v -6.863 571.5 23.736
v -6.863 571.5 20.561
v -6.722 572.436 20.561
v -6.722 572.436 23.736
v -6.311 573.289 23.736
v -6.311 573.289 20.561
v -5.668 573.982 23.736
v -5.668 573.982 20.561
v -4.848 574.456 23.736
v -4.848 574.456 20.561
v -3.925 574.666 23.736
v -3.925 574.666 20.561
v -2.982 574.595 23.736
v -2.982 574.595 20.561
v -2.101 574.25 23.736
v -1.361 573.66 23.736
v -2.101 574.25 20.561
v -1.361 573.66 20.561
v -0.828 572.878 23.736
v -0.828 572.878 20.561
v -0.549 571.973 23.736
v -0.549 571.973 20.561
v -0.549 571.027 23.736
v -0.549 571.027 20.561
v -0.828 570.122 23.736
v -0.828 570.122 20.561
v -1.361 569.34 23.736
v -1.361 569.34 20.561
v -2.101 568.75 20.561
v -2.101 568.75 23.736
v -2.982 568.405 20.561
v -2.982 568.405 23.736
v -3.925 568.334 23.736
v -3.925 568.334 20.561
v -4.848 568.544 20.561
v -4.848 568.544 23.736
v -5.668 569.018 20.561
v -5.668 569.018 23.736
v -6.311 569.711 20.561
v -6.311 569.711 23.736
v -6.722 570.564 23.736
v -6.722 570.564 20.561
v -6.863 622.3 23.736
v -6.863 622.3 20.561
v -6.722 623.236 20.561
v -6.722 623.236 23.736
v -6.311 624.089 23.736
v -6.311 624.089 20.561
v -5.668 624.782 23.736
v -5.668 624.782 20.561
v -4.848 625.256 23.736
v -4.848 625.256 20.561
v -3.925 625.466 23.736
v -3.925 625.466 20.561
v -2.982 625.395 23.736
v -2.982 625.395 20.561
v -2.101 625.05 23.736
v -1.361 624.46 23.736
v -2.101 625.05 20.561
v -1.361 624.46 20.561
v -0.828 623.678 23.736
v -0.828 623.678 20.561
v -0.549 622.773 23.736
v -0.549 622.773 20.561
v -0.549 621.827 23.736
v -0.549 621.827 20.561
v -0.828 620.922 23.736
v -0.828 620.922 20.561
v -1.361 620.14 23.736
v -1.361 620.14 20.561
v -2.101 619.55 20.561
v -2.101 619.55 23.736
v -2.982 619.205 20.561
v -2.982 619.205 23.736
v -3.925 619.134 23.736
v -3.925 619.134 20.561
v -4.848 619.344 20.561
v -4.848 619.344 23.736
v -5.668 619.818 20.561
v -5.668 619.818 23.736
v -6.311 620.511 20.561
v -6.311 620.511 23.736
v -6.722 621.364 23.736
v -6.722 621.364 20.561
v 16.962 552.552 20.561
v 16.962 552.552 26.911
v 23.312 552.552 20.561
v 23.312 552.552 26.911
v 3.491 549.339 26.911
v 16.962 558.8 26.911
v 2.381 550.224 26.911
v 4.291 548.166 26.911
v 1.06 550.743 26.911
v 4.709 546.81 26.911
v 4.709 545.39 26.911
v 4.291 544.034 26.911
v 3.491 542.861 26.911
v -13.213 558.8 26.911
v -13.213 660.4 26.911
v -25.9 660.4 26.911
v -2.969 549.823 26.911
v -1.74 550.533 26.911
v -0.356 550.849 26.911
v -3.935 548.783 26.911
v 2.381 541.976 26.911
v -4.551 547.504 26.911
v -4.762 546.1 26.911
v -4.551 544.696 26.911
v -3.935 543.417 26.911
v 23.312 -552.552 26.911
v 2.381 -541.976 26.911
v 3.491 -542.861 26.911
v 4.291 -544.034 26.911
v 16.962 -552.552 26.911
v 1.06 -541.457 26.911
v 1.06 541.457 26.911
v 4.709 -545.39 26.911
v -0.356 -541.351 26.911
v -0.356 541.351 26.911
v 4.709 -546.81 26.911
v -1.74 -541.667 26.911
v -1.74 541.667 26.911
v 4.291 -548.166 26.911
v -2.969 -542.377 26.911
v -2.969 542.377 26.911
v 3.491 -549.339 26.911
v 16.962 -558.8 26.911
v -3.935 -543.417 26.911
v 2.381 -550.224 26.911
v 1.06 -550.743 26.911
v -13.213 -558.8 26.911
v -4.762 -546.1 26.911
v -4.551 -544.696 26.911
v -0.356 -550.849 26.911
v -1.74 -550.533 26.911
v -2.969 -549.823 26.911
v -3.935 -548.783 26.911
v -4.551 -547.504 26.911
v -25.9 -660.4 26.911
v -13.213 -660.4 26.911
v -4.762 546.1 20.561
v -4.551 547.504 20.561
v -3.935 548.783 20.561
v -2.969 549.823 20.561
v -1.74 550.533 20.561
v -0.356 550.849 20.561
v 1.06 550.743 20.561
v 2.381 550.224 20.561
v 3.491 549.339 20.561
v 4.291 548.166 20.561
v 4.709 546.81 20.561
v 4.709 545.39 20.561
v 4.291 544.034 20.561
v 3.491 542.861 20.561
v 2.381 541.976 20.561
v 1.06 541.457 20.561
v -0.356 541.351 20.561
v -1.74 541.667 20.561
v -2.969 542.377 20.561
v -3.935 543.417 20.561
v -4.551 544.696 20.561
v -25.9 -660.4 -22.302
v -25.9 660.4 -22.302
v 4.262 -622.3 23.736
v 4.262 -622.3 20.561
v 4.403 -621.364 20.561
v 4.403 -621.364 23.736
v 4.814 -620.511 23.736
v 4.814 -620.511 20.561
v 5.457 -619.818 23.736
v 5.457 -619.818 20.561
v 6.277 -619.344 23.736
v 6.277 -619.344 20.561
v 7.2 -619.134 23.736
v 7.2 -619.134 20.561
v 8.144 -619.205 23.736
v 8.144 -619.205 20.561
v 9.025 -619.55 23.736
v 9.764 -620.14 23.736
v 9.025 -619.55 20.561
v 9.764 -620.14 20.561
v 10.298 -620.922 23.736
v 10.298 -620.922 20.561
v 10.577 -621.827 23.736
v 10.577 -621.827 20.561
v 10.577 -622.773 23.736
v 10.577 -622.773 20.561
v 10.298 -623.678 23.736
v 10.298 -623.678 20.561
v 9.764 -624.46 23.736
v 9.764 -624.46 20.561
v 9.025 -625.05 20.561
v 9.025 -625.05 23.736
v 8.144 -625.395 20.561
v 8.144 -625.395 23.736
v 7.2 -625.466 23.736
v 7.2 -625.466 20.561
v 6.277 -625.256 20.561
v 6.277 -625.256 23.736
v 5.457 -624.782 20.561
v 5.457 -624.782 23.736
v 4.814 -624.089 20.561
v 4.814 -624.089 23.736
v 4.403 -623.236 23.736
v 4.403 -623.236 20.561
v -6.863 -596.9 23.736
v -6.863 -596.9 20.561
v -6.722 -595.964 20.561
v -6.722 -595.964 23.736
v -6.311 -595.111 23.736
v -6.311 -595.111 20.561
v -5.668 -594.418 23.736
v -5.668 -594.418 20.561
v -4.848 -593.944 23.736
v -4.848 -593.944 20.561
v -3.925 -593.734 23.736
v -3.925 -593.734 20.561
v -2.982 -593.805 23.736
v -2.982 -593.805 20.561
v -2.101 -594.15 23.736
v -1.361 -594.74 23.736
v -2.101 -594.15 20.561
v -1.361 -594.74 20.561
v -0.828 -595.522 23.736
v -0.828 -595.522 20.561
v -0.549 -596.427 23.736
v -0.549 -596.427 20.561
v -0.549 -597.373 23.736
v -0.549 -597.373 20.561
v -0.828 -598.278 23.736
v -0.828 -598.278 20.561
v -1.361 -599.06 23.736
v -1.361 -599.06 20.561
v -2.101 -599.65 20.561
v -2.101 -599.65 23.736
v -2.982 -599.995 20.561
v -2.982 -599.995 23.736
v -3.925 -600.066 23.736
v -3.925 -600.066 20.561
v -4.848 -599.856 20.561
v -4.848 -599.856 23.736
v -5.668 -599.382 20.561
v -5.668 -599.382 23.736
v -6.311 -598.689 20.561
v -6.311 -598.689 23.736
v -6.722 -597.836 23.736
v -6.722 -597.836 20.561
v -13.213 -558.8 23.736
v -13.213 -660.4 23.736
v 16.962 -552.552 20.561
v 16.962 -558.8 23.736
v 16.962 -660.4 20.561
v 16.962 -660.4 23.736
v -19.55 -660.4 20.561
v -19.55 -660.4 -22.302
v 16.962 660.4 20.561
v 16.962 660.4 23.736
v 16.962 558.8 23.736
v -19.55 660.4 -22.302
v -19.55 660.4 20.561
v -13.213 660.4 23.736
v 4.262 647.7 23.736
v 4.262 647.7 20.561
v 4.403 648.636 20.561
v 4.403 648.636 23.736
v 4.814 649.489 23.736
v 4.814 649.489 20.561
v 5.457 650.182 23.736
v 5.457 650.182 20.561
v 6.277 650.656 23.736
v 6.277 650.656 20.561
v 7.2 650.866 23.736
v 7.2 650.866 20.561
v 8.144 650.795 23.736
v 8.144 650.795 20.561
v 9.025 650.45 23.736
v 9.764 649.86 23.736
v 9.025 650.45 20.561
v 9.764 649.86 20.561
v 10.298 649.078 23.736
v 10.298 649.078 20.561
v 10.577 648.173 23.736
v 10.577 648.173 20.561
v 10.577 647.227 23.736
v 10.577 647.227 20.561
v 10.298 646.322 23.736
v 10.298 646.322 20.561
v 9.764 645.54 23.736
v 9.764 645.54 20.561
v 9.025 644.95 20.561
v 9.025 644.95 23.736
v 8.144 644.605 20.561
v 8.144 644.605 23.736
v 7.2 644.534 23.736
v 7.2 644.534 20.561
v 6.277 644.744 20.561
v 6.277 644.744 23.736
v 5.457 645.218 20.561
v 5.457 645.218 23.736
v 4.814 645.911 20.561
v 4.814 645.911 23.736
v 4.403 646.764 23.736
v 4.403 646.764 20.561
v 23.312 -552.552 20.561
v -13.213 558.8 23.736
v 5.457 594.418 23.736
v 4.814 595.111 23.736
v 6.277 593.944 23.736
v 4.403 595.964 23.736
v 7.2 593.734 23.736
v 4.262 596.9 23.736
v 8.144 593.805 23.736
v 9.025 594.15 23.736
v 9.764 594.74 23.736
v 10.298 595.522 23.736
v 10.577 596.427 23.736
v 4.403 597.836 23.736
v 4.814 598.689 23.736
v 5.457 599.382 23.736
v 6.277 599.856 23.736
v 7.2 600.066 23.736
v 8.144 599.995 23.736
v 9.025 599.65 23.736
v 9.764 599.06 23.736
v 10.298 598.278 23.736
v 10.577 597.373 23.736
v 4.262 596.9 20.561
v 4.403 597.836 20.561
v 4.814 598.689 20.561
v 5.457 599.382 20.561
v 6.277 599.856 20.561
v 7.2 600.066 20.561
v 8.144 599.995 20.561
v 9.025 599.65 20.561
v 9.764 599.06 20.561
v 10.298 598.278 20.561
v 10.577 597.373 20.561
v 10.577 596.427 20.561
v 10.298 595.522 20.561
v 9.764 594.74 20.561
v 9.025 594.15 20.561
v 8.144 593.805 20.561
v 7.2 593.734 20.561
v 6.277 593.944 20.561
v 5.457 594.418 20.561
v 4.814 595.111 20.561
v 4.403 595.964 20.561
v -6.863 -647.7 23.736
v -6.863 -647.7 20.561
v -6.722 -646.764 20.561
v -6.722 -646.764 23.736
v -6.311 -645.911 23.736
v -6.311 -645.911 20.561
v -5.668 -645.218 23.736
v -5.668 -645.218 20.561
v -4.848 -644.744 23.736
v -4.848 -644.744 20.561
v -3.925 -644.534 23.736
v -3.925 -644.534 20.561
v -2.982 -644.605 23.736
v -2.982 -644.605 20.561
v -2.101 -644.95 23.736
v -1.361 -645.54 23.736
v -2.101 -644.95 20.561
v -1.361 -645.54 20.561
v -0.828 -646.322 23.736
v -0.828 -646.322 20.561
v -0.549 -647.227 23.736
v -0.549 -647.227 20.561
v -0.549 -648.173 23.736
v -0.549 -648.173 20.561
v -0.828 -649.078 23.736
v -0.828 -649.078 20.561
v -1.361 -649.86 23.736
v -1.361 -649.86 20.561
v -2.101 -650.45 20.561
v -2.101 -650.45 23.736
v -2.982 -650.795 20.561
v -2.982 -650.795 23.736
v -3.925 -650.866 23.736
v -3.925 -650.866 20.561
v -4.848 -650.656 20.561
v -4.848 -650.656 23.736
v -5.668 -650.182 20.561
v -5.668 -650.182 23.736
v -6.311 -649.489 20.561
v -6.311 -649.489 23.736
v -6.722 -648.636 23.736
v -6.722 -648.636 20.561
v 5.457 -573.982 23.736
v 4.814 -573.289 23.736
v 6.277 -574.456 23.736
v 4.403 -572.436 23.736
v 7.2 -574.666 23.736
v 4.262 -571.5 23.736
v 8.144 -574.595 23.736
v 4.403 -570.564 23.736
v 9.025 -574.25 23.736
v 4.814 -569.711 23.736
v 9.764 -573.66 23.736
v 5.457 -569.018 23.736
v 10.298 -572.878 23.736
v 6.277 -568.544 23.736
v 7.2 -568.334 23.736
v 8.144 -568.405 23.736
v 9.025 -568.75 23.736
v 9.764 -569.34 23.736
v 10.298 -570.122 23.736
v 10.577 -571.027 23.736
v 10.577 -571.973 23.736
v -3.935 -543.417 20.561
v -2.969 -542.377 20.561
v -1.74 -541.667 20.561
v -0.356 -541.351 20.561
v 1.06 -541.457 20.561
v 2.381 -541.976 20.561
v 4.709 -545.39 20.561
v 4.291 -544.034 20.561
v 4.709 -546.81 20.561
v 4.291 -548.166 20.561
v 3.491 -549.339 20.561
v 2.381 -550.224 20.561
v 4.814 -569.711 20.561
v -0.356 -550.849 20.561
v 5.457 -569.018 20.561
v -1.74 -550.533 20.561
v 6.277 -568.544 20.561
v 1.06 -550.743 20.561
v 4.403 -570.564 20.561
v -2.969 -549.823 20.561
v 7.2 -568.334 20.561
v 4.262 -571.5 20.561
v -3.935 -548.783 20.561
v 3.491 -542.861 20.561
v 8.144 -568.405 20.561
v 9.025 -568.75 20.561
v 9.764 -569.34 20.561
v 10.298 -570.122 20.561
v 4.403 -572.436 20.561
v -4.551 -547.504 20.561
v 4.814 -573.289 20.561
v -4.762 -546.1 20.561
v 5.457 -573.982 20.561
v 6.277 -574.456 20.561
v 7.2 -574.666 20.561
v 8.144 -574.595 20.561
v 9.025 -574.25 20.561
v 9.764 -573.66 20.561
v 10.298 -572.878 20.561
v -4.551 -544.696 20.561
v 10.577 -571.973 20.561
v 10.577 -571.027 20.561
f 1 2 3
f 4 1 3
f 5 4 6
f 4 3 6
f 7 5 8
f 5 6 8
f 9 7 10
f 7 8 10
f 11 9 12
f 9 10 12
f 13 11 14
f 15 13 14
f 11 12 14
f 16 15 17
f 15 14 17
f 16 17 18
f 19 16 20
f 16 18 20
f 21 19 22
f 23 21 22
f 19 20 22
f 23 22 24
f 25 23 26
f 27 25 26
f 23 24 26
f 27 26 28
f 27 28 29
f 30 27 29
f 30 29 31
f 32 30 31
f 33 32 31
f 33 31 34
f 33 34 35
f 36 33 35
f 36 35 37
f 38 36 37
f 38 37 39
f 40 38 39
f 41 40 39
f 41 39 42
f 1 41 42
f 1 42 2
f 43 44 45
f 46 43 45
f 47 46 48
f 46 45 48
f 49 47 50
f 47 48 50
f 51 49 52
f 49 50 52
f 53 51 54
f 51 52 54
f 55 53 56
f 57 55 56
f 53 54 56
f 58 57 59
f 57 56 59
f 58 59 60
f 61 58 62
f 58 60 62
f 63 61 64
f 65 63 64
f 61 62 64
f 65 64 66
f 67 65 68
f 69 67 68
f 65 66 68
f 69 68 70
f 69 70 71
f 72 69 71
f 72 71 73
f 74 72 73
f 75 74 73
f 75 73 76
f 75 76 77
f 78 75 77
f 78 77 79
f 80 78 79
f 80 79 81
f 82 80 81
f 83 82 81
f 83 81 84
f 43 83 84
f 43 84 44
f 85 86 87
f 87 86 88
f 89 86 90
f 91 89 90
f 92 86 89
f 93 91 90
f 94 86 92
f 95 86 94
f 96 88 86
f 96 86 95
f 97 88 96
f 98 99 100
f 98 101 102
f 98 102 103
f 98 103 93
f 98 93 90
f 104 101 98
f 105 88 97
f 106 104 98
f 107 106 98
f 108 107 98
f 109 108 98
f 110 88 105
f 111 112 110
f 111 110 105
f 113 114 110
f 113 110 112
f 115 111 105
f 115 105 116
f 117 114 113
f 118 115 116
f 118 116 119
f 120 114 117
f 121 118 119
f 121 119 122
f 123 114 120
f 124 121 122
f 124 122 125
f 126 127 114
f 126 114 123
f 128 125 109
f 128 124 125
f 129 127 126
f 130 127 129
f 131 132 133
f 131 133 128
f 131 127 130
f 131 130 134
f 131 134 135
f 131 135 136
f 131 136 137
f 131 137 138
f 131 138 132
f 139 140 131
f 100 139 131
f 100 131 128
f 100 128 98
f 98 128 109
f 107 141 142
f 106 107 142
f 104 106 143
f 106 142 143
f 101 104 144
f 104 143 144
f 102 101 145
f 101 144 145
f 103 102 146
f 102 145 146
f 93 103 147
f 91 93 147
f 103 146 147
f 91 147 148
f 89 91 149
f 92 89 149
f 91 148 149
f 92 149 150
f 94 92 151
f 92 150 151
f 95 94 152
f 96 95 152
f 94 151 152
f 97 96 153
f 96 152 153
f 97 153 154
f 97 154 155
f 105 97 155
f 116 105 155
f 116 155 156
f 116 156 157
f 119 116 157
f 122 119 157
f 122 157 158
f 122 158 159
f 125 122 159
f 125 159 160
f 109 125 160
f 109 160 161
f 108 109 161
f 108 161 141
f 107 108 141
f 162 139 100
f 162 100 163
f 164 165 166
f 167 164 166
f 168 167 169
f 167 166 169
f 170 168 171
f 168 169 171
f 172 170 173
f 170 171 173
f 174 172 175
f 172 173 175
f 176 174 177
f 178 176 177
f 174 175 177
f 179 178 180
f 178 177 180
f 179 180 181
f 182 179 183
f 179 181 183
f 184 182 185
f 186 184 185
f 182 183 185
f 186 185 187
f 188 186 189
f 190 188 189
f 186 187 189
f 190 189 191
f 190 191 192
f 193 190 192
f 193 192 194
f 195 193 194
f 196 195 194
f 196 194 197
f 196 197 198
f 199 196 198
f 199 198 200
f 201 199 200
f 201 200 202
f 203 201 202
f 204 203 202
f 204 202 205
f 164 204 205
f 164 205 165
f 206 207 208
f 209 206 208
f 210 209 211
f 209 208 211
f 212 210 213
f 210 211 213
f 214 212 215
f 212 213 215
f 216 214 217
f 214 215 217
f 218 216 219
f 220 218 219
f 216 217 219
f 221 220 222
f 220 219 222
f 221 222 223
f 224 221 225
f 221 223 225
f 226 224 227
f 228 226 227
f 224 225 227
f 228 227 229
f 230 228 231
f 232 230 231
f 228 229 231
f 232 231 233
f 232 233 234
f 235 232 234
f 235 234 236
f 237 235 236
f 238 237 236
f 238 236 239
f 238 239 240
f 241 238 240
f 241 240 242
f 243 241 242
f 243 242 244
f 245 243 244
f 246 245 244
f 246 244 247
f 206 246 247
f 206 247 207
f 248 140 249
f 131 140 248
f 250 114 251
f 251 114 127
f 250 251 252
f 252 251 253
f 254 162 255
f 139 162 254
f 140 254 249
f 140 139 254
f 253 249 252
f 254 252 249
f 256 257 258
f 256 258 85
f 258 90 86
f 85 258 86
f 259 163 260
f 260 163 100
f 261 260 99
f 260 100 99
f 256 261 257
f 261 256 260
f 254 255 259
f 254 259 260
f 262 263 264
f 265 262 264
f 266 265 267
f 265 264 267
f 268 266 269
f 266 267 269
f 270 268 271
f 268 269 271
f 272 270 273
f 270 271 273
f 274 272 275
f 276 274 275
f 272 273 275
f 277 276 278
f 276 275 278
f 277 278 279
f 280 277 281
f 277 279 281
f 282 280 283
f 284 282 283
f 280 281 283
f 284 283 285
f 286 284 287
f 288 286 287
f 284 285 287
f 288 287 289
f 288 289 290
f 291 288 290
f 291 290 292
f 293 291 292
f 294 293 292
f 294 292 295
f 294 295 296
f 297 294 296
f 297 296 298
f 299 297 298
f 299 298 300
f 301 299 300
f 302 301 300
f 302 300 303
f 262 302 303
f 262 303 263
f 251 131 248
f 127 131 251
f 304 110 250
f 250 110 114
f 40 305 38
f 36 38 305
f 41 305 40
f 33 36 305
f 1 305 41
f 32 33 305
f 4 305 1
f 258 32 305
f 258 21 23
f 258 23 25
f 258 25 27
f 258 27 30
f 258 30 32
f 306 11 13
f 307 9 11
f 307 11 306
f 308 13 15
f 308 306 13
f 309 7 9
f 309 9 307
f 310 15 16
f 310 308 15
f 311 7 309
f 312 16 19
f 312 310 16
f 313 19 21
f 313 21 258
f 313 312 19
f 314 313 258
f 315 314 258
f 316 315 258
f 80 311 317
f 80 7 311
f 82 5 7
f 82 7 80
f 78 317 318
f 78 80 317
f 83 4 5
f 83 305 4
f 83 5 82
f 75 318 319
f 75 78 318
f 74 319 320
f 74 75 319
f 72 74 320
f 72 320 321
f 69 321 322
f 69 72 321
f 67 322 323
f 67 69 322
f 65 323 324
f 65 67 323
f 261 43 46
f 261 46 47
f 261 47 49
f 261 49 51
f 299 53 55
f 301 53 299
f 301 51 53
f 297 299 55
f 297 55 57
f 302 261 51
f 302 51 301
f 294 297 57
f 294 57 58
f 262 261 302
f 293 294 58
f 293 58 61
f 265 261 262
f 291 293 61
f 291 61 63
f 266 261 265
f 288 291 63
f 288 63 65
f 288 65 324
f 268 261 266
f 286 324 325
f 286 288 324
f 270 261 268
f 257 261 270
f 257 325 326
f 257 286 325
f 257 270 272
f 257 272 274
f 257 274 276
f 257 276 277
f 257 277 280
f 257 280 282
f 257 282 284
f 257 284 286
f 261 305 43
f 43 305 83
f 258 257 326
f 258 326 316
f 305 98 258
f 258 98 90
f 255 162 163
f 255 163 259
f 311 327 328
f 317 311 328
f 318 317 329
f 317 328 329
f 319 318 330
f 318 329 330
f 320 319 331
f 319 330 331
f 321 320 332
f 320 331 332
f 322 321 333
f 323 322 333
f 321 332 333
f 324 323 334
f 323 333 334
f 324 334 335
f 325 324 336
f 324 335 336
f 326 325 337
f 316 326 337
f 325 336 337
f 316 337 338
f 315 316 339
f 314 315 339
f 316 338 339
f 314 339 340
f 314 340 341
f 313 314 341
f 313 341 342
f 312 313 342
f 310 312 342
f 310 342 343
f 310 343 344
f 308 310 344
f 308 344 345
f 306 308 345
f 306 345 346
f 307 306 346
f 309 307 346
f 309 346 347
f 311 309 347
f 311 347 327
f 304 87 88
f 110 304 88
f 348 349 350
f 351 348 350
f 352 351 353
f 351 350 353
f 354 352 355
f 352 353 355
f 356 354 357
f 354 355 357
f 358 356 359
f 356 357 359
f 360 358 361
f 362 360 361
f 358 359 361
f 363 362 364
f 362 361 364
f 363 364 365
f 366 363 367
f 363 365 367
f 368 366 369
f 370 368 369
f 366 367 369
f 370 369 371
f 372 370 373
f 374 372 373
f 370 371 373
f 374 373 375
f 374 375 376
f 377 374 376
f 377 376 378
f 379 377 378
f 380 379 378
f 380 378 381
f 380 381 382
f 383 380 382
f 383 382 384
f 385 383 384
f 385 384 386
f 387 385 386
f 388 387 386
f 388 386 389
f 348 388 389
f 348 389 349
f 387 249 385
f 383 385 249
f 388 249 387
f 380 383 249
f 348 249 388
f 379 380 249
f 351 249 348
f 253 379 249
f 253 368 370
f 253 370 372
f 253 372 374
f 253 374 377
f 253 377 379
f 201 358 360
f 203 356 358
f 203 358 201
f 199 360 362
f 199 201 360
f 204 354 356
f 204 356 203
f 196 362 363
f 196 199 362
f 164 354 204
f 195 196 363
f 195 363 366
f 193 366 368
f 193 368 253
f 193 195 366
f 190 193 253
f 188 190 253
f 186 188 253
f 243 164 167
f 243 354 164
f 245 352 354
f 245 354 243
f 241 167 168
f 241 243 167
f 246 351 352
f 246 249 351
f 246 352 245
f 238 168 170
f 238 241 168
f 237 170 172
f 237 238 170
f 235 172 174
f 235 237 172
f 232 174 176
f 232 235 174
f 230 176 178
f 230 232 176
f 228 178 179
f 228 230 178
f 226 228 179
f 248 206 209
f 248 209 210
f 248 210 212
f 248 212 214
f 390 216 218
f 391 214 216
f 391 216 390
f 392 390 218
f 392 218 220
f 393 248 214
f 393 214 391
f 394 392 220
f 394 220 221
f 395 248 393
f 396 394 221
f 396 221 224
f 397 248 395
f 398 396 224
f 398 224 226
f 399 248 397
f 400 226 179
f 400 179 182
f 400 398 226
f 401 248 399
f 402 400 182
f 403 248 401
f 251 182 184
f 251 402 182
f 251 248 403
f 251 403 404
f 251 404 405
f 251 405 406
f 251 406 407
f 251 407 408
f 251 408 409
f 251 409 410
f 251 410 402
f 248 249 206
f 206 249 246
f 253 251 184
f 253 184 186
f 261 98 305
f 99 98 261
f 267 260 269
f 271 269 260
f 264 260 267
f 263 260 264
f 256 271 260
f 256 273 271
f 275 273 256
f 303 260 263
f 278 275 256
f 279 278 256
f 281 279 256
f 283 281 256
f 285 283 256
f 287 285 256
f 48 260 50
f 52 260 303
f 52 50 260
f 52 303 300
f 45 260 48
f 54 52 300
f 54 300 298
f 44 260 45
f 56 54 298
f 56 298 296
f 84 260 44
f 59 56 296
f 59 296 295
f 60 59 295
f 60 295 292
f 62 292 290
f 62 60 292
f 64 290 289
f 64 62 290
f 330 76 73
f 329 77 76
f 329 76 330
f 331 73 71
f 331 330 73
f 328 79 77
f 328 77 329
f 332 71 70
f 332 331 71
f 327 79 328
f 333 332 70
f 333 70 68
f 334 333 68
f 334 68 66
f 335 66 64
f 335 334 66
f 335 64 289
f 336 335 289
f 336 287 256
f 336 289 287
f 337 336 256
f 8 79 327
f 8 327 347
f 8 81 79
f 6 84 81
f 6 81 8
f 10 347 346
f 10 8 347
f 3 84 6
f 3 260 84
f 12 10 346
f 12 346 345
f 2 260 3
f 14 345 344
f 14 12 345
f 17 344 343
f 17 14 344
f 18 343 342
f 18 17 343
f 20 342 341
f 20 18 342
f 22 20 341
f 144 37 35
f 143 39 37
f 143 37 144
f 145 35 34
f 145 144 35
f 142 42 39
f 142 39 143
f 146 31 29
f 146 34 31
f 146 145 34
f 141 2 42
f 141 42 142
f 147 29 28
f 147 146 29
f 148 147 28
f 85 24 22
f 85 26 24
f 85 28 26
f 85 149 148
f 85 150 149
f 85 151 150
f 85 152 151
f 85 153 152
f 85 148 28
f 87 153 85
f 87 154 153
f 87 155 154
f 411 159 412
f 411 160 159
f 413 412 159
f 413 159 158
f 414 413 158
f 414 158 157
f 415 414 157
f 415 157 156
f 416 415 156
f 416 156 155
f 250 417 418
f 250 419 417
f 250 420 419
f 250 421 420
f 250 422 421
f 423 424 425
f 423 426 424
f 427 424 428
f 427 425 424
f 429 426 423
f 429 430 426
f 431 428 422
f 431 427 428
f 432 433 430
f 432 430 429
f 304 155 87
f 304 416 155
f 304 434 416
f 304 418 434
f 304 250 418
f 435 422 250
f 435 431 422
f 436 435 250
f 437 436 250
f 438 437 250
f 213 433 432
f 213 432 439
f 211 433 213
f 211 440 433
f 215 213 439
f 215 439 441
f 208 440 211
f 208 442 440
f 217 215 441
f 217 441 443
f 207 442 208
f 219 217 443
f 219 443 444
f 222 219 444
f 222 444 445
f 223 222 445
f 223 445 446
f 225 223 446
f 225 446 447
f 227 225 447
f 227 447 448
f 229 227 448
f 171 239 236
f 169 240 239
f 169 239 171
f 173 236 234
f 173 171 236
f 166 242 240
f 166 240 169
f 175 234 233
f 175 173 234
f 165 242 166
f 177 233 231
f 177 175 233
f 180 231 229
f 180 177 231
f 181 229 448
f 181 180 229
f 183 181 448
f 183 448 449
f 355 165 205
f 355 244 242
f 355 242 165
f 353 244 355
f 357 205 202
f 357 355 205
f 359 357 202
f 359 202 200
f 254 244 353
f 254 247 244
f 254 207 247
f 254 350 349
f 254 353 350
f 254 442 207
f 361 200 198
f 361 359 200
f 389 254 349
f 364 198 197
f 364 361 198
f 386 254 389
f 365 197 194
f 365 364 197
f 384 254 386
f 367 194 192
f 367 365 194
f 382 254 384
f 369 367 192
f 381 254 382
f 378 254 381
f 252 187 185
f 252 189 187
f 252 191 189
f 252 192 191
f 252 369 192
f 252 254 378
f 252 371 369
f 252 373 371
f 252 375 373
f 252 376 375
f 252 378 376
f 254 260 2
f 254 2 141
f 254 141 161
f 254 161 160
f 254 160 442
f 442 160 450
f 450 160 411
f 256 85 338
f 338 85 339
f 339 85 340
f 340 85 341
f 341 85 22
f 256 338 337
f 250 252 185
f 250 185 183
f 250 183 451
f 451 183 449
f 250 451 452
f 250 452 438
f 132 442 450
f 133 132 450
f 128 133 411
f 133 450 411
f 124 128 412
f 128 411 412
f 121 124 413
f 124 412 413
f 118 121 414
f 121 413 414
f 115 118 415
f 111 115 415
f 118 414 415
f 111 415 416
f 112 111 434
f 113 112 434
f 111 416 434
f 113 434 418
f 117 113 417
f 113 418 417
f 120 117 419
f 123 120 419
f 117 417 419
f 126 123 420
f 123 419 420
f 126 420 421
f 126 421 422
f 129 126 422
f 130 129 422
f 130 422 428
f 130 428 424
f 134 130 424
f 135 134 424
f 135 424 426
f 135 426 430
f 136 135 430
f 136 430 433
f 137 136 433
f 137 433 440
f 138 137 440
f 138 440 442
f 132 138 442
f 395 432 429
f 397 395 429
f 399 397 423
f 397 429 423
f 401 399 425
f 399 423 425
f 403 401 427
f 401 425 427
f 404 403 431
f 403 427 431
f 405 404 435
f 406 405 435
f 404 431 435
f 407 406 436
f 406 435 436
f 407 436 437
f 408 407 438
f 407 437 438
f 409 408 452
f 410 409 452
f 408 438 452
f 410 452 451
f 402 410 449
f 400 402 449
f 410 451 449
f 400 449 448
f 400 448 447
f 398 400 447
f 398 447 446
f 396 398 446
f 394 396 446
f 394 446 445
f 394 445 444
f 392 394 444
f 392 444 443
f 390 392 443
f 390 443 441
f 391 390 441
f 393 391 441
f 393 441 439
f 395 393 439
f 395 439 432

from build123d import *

# Parameters (mm, degrees)
F1_DEPTH = 660.4
F3_DEPTH = 49.2135
F2_W     = 30.1752
F2_H     = 101.6
F2_R     = 3.175
F4_DEPTH = 3.175
F5_D     = 6.35
F6_D     = 9.525


with BuildPart() as f1:
    # F0 (on Front) → F1 (new body, symmetric)
    with BuildSketch(Plane.XZ):
        Polygon((23.312041, 26.91088), (-25.900459, 26.91088), (-25.900459, -22.30162), (-19.550459, -22.30162), (-19.550459, 20.56088), (23.312041, 20.56088), align=None)
    extrude(amount=F1_DEPTH, both=True)

    # F2 (on face) → F3 (cut, through all)
    with BuildSketch(Plane.XY.offset(26.91088)):
        Polygon((16.962041, 552.5516), (23.312041, 552.5516), (23.312041, 660.4), (16.962041, 660.4), (16.962041, 558.8), align=None)
        Polygon((23.312041, -660.4), (23.312041, -552.5516), (16.962041, -552.5516), (16.962041, -558.8), (16.962041, -660.4), align=None)
    extrude(amount=-F3_DEPTH, mode=Mode.SUBTRACT)

    # F2 (on face) → F4 (cut)
    with BuildSketch(Plane.XY.offset(26.91088)):
        with Locations((1.874441, -609.6)):
            Rectangle(F2_W, F2_H)
        with Locations((-3.688159, -647.7)):
            Circle(F2_R, mode=Mode.SUBTRACT)
        with Locations((-3.688159, -596.9)):
            Circle(F2_R, mode=Mode.SUBTRACT)
        with Locations((7.437041, -622.3)):
            Circle(F2_R, mode=Mode.SUBTRACT)
        with Locations((7.437041, -571.5)):
            Circle(F2_R, mode=Mode.SUBTRACT)
        with Locations((1.874441, 609.6)):
            Rectangle(F2_W, F2_H)
        with Locations((-3.688159, 571.5)):
            Circle(F2_R, mode=Mode.SUBTRACT)
        with Locations((-3.688159, 622.3)):
            Circle(F2_R, mode=Mode.SUBTRACT)
        with Locations((7.437041, 596.9)):
            Circle(F2_R, mode=Mode.SUBTRACT)
        with Locations((7.437041, 647.7)):
            Circle(F2_R, mode=Mode.SUBTRACT)
    extrude(amount=-F4_DEPTH, mode=Mode.SUBTRACT)

    # F5 (through all)
    with Locations(Plane.XY.offset(26.91088)):
        with Locations((-3.688159, -596.9), (7.437041, -571.5), (7.437041, -622.3), (-3.688159, -647.7), (7.437041, 596.9), (-3.688159, 622.3), (7.437041, 647.7), (-3.688159, 571.5)):
            Hole(F5_D / 2)

    # F6 (through all)
    with Locations(Plane.XY.offset(26.91088)):
        with Locations((0, -546.1), (0, 546.1)):
            Hole(F6_D / 2)


solid = f1.part
